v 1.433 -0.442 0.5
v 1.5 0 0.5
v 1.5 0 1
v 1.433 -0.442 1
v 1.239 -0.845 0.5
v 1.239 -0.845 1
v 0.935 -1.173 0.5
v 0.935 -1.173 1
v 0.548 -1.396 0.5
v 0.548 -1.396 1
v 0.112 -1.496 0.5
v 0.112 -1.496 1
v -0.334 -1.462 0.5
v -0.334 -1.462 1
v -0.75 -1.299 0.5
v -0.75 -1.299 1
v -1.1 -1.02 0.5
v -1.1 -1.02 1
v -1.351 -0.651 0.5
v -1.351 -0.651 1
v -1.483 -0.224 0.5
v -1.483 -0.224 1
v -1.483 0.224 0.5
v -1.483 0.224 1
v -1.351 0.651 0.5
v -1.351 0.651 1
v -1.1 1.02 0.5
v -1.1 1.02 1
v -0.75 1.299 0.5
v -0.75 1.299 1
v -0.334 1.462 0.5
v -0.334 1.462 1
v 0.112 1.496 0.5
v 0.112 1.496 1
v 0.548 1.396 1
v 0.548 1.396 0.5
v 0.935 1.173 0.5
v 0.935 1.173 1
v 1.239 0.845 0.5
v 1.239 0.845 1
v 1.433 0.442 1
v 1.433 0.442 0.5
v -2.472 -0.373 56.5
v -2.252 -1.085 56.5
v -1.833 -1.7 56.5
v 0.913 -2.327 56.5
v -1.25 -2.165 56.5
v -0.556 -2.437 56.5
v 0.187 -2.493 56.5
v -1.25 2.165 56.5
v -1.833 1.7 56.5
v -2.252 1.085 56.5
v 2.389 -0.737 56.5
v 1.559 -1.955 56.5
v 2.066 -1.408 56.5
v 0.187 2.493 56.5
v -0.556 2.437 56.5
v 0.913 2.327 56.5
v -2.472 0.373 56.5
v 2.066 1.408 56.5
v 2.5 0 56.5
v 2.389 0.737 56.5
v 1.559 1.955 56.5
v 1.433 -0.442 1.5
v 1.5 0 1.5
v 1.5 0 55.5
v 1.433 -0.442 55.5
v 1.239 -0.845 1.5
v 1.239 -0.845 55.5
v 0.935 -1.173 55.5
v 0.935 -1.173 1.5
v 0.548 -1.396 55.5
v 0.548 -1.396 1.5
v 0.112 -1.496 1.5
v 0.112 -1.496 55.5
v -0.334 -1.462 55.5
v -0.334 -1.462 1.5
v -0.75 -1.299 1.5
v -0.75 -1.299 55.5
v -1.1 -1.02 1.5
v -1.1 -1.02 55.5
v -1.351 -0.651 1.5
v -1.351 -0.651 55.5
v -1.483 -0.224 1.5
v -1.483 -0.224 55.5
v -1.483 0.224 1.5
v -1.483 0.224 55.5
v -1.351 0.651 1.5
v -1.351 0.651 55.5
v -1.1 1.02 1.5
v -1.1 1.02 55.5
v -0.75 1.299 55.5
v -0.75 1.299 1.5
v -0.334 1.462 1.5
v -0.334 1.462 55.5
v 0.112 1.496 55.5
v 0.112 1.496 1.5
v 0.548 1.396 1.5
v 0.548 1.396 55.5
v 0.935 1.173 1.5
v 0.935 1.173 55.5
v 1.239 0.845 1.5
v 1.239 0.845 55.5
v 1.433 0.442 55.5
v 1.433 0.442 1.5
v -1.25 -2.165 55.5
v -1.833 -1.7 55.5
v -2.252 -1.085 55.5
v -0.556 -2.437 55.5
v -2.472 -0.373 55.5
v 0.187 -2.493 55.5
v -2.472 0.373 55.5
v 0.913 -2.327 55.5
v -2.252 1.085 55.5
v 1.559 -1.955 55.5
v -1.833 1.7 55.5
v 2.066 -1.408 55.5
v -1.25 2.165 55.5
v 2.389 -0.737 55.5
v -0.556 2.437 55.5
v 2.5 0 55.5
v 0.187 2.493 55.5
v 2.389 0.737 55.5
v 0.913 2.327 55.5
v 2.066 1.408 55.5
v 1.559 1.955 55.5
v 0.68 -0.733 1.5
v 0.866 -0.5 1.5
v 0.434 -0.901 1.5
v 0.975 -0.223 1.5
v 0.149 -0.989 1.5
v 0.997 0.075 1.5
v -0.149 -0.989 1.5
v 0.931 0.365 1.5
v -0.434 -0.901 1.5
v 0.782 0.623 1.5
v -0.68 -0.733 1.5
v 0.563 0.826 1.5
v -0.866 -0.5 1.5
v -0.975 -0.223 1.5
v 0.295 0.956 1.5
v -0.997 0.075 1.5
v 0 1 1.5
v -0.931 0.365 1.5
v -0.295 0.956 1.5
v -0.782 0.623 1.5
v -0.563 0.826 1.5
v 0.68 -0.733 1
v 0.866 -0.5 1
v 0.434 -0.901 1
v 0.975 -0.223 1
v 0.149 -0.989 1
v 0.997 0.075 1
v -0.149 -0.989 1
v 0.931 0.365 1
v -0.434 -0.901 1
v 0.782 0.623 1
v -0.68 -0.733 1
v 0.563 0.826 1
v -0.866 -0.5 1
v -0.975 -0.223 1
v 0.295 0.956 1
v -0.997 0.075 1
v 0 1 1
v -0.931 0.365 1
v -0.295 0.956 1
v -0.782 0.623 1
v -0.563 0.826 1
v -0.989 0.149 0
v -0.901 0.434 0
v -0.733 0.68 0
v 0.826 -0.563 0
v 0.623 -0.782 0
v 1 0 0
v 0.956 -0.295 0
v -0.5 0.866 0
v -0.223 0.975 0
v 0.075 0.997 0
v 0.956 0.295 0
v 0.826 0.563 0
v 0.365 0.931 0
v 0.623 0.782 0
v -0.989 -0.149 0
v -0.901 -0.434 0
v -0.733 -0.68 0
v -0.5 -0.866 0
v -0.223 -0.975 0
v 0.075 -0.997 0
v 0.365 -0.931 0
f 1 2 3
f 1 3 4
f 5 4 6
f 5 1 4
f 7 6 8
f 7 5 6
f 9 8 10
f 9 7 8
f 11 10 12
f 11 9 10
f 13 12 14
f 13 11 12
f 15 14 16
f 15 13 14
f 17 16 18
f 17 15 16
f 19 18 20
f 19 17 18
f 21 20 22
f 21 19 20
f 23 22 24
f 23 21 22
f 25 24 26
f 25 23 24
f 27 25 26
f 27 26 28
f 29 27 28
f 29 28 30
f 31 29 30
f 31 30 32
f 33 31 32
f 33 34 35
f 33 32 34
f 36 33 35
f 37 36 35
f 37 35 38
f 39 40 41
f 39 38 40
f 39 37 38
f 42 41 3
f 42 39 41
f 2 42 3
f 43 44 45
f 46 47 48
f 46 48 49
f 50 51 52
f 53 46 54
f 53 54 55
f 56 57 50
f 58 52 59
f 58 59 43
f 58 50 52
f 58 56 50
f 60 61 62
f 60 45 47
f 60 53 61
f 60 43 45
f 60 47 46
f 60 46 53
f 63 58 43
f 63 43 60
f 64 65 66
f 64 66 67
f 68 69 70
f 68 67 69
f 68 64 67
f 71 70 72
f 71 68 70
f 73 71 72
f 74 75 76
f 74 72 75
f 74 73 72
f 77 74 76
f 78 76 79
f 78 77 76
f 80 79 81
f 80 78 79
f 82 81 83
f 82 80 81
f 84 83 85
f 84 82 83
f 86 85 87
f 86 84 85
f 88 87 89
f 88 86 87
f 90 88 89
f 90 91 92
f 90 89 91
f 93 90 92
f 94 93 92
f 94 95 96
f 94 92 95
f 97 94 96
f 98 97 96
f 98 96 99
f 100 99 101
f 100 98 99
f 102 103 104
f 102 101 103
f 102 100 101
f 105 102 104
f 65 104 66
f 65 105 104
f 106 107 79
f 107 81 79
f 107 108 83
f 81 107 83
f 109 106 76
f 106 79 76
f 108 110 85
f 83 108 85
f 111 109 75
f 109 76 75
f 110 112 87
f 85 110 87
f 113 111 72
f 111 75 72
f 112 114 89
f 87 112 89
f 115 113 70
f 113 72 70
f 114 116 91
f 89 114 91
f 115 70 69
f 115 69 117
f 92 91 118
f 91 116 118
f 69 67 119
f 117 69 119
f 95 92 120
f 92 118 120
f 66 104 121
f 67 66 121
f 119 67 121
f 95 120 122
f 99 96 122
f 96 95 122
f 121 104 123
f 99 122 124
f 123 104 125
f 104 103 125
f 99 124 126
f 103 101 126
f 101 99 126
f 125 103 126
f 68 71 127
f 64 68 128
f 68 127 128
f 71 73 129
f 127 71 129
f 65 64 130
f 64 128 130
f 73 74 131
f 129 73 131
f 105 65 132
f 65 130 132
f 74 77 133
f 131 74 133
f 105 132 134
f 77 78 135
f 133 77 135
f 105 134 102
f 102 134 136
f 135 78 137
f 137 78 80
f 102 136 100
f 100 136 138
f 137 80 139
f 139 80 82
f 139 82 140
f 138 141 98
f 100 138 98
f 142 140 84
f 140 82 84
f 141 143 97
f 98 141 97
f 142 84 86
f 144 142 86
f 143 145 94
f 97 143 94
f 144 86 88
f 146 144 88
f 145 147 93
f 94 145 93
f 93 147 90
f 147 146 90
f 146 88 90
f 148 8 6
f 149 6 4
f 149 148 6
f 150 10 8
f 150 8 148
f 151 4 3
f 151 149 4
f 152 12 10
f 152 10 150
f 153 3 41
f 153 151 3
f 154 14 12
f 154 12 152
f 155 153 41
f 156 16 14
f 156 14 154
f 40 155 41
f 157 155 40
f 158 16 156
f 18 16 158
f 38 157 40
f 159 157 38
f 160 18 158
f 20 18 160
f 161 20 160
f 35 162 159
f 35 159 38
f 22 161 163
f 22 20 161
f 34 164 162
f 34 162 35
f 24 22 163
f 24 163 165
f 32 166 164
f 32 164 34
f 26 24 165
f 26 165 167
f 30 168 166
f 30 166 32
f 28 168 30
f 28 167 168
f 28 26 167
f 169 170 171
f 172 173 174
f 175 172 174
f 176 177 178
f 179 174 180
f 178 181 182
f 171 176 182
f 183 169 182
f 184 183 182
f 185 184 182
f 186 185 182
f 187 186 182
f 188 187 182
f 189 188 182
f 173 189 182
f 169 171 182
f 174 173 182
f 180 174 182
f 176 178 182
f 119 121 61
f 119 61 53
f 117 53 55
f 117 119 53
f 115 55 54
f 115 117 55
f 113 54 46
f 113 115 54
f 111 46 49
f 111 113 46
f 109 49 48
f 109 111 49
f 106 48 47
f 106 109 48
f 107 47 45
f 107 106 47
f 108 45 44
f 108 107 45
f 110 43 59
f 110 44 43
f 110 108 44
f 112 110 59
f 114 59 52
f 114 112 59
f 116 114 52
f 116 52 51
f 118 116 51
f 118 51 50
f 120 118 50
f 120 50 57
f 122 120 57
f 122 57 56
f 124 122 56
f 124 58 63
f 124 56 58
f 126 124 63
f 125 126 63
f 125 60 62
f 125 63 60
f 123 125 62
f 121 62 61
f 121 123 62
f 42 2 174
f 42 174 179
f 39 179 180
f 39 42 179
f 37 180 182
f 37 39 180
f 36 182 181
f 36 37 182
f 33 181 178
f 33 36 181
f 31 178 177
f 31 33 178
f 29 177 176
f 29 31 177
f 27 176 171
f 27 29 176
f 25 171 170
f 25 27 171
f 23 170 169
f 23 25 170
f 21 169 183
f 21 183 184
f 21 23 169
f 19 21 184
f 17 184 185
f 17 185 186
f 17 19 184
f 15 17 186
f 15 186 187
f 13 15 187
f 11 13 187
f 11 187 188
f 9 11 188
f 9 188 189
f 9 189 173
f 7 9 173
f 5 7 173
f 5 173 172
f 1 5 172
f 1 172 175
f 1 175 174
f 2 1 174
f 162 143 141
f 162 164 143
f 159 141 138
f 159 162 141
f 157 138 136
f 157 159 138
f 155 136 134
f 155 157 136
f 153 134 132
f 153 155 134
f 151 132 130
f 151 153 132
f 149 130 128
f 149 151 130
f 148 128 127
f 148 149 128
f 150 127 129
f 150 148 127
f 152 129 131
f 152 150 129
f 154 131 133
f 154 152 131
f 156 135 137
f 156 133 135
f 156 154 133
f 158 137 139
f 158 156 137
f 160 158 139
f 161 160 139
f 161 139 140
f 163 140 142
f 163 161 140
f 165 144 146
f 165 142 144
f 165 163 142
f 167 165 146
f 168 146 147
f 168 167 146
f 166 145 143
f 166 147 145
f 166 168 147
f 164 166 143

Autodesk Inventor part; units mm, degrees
ref_plane "YZ Plane" through (0, 0, 0) normal (1, 0, 0) x (0, 1, 0)
ref_plane "XZ Plane" through (0, 0, 0) normal (0, 1, 0) x (-1, 0, 0)
ref_plane "XY Plane" through (0, 0, 0) normal (0, 0, 1) x (1, 0, 0)
sketch "Sketch1" plane through (0, 0, 0) normal (0, 0, 1) x (1, 0, 0)
  circle A0 centre (0, 0) radius 1.5
  dimension "d0" = 3
extrude "Extrusion1" add sketch "Sketch1" along normal blind 55.5
sketch "Sketch2" plane through (0, 0, 55.5) normal (0, 0, 1) x (1, 0, 0)
  circle A0 centre (0, 0) radius 1.5 projected
  circle A1 centre (0, 0) radius 2.5
  dimension "d3" = 5
extrude "Extrusion2" add sketch "Sketch2" along normal blind 1 contours A0 | A1
sketch "Sketch3" plane through (0, 0, 0) normal (1, 0, 0) x (0, 1, 0)
  line L0 (-1.5, 55.5) -> (-2.5, 55.5) projected
  line L1 (-2.5, 55.5) -> (-2.5, 56.5) projected
  line L2 (-2.5, 56.5) -> (2.5, 56.5) projected
  line L3 (2.5, 56.5) -> (2.5, 55.5) projected
  line L4 (2.5, 55.5) -> (1.5, 55.5) projected
  line L5 (1.5, 55.5) -> (1.5, 0) projected
  line L6 (1.5, 0) -> (-1.5, 0) projected
  line L7 (-1.5, 0) -> (-1.5, 55.5) projected
  line L8 (1.5, 1.5) -> (1, 1.5)
  line L9 (1, 1.5) -> (1, 1)
  line L10 (1, 1) -> (1.5, 1)
  line L11 (1.5, 1) -> (1.5, 1.5)
  line L12 (0, -11.4) -> (0, 68.4) projected
  point P0 (0, 0)
  dimension "d6" = 54
  dimension "d7" = 0.5
  dimension "d8" = 0.5
revolve "Revolution1" cut sketch "Sketch3" angle 360 about axis through (0, 0, -10) along (0, 0, 1) contours L10 L9 L8 L5
chamfer "Chamfer1" distance 0.5 angle 45 1 edges at (-1.5, 0, 0)
properties part number "Axle" material "Aluminum 6061"
